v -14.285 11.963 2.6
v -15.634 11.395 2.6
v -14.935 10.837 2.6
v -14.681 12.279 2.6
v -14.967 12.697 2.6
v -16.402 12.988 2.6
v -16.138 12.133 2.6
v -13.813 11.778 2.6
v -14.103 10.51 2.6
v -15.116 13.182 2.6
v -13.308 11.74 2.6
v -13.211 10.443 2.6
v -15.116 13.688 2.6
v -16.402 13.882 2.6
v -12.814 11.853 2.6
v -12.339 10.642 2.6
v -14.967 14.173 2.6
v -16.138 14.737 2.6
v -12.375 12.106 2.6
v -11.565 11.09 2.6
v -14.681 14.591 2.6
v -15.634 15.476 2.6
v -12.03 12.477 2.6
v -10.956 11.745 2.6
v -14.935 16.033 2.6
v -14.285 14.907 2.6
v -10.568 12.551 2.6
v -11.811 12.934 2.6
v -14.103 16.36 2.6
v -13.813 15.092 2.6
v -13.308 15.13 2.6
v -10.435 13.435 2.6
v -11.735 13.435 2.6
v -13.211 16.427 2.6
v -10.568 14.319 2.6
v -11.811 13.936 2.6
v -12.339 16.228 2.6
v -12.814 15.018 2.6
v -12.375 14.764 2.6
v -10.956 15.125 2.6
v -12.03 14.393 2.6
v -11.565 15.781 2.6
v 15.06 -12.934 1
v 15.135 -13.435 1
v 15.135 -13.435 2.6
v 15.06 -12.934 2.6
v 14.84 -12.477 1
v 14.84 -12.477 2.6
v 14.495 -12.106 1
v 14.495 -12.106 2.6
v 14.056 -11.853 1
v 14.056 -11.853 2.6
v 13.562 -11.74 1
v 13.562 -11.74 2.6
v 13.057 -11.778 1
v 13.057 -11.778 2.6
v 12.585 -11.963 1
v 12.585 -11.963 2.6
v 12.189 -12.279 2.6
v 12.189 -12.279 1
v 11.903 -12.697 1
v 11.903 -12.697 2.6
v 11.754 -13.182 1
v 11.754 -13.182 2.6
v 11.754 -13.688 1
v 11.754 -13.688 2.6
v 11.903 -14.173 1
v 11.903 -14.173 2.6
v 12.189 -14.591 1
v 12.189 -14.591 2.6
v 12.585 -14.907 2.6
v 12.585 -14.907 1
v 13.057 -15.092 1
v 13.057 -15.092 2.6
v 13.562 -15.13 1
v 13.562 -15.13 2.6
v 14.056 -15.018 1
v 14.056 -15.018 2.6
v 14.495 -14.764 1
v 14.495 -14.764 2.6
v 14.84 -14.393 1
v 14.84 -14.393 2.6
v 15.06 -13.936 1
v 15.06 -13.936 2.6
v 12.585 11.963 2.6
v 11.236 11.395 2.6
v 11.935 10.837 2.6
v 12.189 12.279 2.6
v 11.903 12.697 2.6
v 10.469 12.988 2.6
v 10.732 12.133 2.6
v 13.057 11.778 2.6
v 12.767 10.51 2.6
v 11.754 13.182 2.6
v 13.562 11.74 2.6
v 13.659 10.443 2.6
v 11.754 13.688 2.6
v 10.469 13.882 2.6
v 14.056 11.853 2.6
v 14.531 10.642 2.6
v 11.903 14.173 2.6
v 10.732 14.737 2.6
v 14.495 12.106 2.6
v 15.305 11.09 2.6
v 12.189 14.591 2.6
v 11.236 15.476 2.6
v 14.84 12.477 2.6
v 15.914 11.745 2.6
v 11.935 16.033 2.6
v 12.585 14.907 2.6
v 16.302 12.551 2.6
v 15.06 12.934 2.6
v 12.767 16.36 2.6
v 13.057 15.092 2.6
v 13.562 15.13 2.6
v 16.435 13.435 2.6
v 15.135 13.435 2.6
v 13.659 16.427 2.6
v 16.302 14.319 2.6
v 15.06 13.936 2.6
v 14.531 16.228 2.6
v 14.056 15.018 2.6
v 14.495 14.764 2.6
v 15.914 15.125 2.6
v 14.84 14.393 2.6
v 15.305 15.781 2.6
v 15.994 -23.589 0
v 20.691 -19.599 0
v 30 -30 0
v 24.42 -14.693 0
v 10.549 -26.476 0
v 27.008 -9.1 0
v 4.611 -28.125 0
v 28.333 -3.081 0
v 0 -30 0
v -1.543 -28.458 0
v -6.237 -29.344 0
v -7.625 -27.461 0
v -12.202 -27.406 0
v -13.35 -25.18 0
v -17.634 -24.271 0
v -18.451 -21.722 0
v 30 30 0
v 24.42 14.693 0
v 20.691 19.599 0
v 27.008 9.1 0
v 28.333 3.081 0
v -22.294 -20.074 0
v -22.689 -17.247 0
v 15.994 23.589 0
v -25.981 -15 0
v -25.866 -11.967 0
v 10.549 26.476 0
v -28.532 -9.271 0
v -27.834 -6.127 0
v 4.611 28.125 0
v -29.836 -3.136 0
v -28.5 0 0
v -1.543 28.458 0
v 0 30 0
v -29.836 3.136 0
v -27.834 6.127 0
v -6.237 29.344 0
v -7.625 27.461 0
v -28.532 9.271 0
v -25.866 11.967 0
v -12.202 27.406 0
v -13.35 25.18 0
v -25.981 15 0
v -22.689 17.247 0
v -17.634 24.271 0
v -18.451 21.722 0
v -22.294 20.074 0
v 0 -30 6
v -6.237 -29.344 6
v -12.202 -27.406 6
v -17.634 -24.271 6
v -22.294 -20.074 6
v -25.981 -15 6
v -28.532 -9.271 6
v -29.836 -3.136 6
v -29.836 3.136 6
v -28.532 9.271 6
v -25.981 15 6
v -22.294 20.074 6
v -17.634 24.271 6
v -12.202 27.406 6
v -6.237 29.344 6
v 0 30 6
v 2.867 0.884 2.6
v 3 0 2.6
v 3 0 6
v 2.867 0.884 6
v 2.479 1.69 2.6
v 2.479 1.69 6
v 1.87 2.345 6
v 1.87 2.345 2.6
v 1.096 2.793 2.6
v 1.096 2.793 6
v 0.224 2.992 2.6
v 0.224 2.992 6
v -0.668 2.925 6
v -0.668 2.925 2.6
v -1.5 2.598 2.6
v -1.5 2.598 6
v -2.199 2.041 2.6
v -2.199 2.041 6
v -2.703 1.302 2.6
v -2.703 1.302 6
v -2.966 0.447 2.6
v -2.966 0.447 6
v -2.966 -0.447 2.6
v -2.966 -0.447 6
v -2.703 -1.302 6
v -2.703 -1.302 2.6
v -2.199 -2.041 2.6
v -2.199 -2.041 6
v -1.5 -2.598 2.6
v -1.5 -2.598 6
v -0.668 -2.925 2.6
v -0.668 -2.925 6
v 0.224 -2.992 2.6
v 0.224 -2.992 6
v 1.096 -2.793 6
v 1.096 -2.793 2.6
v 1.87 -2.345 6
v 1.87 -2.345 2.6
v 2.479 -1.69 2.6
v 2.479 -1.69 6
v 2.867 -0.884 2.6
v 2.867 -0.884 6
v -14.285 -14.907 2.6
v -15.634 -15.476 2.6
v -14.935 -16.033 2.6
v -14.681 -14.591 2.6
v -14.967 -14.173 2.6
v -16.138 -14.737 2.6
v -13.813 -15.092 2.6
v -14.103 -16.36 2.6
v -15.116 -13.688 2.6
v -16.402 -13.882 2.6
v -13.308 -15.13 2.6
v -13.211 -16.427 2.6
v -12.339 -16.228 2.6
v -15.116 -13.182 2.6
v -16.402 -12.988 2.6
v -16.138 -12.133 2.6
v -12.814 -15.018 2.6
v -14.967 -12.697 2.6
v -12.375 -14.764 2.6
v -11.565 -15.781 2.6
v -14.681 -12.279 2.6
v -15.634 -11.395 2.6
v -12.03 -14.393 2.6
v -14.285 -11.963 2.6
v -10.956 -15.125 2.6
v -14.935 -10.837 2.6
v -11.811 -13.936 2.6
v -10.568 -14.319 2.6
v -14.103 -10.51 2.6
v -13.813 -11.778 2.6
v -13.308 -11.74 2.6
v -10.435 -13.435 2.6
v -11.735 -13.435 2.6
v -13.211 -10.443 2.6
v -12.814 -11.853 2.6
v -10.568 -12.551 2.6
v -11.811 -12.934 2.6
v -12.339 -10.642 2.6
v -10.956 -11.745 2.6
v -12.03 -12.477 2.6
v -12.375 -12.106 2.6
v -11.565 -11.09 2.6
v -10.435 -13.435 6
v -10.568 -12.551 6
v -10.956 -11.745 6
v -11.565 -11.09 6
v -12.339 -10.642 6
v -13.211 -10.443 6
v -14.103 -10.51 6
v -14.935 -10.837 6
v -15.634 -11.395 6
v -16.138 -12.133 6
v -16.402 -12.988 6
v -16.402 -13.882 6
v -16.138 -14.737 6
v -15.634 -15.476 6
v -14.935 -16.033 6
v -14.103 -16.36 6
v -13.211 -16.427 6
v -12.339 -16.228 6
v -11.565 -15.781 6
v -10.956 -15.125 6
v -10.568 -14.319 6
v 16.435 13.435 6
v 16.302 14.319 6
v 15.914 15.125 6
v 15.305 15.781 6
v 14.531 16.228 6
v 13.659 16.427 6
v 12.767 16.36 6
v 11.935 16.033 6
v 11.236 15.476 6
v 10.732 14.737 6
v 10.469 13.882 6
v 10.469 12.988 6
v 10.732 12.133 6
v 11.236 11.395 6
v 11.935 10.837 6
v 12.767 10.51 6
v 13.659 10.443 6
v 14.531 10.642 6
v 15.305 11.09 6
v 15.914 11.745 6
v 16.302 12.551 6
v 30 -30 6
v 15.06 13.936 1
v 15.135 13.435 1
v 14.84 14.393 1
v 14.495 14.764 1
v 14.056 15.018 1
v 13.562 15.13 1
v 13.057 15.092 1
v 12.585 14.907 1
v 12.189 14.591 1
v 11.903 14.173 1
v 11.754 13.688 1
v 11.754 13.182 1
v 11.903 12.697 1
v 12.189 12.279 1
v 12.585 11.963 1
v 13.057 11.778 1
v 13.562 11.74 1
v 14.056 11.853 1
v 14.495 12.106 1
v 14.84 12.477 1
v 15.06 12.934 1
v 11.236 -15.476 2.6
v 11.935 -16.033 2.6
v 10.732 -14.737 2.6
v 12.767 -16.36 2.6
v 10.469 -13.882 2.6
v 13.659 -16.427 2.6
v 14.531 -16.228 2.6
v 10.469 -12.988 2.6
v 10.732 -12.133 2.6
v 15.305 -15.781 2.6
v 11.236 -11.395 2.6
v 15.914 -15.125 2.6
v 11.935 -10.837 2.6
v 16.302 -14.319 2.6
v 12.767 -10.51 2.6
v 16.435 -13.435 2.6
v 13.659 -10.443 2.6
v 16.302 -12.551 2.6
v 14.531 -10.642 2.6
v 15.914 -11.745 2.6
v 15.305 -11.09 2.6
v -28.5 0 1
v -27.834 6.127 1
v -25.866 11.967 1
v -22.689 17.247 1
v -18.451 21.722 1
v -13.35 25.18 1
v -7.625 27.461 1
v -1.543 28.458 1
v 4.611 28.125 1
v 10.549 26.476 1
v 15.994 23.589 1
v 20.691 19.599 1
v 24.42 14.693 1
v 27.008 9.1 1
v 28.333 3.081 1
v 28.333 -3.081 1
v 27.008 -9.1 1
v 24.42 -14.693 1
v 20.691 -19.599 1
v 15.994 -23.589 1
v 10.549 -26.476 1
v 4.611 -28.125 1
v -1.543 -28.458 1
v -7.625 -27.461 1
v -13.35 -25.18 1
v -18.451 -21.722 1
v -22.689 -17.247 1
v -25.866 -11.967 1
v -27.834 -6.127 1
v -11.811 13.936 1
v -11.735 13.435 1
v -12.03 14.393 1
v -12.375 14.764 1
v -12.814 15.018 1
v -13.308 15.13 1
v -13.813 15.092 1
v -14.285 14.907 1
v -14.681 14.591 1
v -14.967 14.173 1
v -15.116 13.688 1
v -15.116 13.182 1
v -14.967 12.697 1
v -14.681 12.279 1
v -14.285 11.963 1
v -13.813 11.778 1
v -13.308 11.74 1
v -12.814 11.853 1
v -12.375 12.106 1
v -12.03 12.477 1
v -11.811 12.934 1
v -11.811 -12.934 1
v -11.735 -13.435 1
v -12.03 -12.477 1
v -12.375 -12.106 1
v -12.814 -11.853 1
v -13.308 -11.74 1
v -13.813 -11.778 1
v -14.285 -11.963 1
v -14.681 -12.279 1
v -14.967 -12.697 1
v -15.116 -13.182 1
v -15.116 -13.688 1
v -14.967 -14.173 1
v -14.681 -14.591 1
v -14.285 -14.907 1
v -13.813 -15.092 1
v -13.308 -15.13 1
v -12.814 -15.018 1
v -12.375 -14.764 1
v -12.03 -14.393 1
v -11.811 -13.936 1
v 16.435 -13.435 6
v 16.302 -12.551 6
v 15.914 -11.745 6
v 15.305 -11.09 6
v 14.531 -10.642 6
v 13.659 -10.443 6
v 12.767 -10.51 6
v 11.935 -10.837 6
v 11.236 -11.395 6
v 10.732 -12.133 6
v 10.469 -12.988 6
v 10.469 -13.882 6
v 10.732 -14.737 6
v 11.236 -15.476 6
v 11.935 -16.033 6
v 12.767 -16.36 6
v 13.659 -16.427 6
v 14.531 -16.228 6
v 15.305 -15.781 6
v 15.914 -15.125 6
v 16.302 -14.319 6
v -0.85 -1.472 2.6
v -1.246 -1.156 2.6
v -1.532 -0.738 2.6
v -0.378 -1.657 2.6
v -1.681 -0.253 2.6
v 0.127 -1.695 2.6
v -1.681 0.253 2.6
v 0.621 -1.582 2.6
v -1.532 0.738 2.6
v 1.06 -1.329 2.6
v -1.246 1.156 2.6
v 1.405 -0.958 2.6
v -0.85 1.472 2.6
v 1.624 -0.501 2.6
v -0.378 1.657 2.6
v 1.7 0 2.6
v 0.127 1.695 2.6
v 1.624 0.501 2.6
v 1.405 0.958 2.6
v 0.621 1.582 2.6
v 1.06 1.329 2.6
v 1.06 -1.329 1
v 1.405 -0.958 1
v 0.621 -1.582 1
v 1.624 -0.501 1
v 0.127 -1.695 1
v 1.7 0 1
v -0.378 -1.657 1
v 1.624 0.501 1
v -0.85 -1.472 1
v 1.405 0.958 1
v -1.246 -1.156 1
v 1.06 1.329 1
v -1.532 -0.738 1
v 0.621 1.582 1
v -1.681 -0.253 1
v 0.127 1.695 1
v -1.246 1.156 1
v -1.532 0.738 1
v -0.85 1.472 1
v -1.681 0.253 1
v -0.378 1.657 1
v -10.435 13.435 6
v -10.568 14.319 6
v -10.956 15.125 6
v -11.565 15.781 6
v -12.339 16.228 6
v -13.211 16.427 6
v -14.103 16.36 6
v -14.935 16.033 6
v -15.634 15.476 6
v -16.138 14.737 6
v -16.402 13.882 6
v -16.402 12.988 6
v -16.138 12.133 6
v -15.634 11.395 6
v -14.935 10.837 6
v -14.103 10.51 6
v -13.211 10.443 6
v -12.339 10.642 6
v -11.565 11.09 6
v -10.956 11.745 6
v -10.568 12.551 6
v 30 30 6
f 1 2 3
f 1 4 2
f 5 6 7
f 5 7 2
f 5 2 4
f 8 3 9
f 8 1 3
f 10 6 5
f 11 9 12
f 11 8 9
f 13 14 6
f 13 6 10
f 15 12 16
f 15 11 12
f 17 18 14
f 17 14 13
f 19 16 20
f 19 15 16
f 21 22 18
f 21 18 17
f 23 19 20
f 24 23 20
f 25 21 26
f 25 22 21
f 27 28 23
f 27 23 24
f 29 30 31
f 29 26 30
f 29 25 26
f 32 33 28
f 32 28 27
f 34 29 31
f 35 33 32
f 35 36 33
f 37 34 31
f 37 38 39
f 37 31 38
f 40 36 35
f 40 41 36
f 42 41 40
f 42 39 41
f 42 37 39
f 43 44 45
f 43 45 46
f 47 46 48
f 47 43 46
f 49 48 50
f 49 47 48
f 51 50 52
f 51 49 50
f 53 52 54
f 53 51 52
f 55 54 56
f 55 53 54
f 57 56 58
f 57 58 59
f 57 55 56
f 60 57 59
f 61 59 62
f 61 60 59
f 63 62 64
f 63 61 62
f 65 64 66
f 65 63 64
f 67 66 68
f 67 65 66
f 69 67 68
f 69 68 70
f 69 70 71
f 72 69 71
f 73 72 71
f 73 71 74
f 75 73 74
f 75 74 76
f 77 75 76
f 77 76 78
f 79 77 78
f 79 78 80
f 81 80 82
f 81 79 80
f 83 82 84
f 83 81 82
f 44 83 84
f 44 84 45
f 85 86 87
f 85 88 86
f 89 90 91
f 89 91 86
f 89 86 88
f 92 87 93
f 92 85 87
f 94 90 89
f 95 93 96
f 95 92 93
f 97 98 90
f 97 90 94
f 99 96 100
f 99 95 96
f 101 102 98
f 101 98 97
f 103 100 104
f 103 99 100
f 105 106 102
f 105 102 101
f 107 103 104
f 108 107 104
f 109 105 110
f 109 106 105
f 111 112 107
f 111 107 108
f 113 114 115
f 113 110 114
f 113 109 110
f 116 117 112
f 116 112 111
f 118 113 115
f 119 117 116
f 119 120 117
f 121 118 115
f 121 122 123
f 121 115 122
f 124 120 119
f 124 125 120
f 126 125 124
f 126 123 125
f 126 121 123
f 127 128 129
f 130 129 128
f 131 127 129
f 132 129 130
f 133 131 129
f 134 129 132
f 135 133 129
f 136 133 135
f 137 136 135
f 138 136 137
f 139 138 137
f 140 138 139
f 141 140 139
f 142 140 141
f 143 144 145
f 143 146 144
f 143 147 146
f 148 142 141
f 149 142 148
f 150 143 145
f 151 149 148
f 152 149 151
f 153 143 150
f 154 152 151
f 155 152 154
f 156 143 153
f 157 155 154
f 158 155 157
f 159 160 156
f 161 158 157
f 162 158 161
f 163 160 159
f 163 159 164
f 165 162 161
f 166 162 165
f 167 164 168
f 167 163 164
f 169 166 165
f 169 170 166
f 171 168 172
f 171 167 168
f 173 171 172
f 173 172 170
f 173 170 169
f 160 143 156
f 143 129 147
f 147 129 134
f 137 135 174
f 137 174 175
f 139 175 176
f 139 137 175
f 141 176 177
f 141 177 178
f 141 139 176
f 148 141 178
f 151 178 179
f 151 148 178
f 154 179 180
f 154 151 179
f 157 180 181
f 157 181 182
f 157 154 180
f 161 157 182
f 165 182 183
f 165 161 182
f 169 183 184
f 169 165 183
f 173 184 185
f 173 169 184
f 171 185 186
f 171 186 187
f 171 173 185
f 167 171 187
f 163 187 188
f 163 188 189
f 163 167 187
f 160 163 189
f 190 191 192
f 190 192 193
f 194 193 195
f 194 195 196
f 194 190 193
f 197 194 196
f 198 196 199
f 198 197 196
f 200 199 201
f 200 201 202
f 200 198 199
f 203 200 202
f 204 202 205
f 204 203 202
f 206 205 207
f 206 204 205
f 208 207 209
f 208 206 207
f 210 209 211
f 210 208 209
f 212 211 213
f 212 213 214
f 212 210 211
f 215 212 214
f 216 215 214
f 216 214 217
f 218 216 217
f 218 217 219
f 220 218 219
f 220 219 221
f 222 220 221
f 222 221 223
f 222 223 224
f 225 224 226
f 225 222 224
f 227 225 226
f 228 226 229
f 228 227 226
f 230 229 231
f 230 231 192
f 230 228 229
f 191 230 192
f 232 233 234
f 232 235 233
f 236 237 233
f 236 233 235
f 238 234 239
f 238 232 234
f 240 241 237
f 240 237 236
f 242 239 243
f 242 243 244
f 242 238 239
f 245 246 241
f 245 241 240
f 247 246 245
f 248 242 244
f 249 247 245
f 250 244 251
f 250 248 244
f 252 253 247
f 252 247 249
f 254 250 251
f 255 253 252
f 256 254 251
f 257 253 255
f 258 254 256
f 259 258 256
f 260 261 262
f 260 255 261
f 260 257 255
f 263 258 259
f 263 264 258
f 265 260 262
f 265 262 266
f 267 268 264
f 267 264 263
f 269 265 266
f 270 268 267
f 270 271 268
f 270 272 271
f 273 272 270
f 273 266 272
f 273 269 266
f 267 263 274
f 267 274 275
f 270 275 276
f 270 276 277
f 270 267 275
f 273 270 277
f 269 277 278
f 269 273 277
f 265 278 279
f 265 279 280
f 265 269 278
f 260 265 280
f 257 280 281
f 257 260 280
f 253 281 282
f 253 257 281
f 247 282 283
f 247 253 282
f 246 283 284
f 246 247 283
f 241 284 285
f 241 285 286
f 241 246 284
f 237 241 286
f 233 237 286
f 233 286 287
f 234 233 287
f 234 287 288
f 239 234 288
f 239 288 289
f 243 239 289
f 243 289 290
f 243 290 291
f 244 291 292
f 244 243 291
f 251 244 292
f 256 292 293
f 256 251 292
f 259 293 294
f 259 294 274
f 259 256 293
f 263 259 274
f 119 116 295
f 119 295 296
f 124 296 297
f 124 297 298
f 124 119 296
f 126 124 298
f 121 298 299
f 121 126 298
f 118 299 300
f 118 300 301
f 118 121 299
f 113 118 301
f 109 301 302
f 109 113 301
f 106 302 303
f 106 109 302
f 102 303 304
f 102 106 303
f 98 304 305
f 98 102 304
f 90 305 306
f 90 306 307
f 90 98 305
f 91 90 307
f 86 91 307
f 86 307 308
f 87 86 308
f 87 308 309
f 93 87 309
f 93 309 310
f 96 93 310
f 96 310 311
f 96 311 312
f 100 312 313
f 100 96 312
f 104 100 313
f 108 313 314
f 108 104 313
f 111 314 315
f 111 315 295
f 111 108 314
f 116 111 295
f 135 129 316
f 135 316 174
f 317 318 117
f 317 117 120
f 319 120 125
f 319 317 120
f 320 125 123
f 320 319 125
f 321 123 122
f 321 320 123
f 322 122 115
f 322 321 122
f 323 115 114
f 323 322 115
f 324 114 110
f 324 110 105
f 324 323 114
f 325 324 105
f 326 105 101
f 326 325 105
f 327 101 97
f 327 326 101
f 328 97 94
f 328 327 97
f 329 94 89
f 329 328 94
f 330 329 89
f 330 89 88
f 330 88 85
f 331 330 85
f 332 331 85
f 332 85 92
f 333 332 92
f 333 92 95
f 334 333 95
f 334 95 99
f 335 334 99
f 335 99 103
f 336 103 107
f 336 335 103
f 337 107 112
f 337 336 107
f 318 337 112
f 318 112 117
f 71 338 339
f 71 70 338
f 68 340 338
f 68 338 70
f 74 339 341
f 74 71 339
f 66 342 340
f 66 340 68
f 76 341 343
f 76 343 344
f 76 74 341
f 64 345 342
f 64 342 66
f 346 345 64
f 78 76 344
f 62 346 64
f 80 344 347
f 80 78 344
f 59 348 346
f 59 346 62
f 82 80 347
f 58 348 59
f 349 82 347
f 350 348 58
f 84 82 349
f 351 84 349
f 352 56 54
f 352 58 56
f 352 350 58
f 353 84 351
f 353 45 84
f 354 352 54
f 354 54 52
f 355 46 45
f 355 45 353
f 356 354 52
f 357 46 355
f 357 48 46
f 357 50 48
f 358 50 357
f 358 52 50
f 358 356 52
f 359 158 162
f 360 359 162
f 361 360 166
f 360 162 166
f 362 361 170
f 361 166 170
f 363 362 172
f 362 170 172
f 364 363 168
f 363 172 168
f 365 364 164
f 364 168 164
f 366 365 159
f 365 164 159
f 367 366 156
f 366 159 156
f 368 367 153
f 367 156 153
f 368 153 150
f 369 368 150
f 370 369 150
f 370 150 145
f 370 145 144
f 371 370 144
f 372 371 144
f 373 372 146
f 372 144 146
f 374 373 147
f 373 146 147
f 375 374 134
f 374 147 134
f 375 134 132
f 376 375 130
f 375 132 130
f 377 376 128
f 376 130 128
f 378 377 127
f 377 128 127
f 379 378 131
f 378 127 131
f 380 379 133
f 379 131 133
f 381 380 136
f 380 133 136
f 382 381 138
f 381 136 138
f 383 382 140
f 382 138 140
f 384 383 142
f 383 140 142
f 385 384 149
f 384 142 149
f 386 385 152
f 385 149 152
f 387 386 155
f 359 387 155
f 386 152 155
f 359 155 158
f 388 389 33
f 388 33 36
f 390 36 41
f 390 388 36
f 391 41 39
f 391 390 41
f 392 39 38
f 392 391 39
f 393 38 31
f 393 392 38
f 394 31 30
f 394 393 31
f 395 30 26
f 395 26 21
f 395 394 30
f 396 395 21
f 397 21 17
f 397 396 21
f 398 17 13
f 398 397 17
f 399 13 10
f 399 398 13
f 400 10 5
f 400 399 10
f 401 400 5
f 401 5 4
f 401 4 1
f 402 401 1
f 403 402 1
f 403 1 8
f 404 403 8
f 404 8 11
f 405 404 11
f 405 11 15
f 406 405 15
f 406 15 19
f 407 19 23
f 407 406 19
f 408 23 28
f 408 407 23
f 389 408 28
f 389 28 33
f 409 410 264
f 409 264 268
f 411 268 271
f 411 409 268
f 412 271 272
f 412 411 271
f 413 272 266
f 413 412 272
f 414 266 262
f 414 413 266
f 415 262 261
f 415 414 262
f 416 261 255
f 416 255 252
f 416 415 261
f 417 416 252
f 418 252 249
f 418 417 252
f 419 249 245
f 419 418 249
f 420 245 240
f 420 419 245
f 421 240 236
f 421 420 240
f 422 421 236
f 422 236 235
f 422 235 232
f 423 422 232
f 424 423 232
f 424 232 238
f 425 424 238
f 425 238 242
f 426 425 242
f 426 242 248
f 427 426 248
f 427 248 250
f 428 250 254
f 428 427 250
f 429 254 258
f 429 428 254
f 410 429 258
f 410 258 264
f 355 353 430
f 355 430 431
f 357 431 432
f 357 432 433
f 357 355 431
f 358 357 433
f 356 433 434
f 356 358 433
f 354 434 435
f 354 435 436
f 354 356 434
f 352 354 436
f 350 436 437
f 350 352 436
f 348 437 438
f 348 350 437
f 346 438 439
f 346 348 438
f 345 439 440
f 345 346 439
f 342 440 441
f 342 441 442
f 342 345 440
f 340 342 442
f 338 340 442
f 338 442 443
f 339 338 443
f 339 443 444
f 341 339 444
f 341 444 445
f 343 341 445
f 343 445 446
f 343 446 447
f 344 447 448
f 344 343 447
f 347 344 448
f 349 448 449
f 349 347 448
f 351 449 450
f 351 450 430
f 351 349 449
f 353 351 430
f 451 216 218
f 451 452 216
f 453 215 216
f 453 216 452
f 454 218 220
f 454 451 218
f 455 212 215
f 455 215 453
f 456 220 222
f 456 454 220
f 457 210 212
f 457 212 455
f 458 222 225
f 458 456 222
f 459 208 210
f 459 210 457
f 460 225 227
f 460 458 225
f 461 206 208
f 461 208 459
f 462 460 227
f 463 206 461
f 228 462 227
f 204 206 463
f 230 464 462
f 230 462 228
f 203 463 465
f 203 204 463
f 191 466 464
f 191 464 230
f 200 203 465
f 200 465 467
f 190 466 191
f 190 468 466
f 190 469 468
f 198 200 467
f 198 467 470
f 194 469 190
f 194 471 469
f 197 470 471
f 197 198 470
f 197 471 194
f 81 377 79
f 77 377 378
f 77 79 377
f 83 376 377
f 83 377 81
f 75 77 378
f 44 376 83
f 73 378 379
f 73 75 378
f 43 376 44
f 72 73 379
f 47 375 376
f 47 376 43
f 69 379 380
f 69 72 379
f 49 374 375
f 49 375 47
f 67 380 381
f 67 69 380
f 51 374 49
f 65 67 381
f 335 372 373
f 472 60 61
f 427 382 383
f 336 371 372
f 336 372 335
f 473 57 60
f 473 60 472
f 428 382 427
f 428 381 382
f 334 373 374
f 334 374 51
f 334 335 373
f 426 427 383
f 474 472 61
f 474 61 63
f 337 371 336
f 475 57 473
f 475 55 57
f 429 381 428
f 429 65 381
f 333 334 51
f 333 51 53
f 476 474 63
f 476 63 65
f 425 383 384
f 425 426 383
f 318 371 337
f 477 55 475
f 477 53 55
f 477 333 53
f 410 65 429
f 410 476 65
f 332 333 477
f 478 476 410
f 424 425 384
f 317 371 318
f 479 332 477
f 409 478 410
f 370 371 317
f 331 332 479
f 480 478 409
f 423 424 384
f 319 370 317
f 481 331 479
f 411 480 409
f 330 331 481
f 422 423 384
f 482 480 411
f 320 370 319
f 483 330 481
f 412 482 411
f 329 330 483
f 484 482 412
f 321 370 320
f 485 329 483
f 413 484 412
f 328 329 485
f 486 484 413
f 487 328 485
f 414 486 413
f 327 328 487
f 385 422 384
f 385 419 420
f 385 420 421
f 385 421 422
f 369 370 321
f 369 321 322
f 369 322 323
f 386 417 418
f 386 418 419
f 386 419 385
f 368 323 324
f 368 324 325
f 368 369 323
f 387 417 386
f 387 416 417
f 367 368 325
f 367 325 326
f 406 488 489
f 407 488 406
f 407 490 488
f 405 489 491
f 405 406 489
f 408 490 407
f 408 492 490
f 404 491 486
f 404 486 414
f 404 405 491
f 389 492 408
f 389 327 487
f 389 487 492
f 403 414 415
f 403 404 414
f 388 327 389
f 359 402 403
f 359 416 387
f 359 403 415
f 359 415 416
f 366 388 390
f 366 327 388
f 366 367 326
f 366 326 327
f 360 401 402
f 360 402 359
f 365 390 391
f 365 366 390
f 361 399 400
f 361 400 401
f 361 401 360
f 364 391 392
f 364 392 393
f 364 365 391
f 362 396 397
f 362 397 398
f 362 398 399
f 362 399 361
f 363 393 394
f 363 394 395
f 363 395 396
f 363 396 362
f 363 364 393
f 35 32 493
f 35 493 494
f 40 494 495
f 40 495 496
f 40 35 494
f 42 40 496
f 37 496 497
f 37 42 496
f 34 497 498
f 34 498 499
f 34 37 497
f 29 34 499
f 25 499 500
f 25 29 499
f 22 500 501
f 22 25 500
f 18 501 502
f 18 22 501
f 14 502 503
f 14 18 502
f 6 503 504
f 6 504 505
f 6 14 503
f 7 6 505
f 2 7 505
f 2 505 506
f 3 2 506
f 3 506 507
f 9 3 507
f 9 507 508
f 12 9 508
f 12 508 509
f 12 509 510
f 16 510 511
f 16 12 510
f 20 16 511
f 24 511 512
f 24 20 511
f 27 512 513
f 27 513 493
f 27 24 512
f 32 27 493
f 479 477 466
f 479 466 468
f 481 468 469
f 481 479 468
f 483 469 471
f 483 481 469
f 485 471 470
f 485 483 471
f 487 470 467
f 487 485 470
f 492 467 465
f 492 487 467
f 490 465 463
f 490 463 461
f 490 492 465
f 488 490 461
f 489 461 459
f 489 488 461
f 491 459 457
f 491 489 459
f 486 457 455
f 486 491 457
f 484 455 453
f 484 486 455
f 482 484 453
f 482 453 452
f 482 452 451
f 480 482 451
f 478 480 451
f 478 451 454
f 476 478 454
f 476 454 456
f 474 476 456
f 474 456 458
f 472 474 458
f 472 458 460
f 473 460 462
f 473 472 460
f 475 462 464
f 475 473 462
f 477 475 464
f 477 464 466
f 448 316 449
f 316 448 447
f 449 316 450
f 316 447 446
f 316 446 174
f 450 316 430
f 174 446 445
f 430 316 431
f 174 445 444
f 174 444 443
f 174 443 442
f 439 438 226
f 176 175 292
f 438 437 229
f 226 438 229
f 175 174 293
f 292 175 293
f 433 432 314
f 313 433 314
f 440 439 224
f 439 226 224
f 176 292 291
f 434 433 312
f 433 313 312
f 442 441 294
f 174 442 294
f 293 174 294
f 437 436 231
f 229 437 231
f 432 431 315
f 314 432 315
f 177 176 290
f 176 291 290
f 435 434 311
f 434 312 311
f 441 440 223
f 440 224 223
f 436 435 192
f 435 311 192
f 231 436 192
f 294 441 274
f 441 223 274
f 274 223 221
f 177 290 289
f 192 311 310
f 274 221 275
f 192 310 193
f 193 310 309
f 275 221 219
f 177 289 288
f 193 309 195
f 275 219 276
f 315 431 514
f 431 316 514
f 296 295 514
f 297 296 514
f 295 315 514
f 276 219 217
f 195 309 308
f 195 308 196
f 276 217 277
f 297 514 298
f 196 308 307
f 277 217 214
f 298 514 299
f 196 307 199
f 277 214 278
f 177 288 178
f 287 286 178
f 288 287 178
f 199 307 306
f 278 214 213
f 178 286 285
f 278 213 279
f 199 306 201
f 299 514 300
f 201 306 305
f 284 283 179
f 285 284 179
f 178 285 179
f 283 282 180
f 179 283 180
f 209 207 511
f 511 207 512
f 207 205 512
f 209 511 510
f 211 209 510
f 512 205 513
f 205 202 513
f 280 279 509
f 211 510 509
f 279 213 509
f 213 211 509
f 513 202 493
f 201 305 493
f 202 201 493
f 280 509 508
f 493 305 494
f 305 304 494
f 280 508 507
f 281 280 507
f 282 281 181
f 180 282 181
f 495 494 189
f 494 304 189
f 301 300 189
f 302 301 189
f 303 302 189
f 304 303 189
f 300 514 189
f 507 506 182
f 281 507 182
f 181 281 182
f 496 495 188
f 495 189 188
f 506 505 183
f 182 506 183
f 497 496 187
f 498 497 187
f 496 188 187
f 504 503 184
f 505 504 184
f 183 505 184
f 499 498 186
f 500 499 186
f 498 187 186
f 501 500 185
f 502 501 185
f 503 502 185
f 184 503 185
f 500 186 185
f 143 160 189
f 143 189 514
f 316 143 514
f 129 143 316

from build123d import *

# Parameters (mm, degrees)
EXTRUDE_1_DEPTH              = 6
SKETCH_2_R                   = 28.5
CUT_EXTRUDE_1_DEPTH          = 1
HOLE_START                   = 2.6
HOLE_WIZARD_M3_1_OUTLINE_R   = 3
HOLE_WIZARD_M3_1_DEPTH       = 3.4
HOLE_START_2                 = 1
HOLE_WIZARD_M3_1_2_OUTLINE_R = 1.7
HOLE_WIZARD_M3_1_2_DEPTH     = 1.6


# Read off the part's stored shape, not the designer's step: M3 六角圆柱头螺钉的柱形沉头孔1
with BuildPart() as part:
    # 草图1 → 凸台-拉伸1 (new body)
    with BuildSketch(Plane.XY):
        with BuildLine():
            Line((0, 30), (30, 30))
            Line((30, 30), (30, -30))
            Line((30, -30), (0, -30))
            ThreePointArc((0, -30), (-30, 0), (0, 30))
        make_face()
    extrude(amount=EXTRUDE_1_DEPTH)

    # 草图2 → 切除-拉伸1 (cut)
    with BuildSketch(Plane(origin=(0, 0, 0), x_dir=(-1, 0, 0), z_dir=(0, 0, -1))):
        Circle(SKETCH_2_R)
    extrude(amount=-CUT_EXTRUDE_1_DEPTH, mode=Mode.SUBTRACT)

    # M3 六角圆柱头螺钉的柱形沉头孔1 outline → M3 六角圆柱头螺钉的柱形沉头孔1 (cut)
    with BuildSketch(Plane.XY.offset(HOLE_START)):
        with Locations((13.435028843, 13.435028843)):
            Circle(HOLE_WIZARD_M3_1_OUTLINE_R)
        with Locations((-13.435028843, -13.435028843)):
            Circle(HOLE_WIZARD_M3_1_OUTLINE_R)
        with Locations((-13.435028843, 13.435028843)):
            Circle(HOLE_WIZARD_M3_1_OUTLINE_R)
        with Locations((13.435028843, -13.435028843)):
            Circle(HOLE_WIZARD_M3_1_OUTLINE_R)
        Circle(HOLE_WIZARD_M3_1_OUTLINE_R)
    extrude(amount=HOLE_WIZARD_M3_1_DEPTH, mode=Mode.SUBTRACT)

    # Hole Wizard M3 _1 2 outline → Hole Wizard M3 _1 2 (cut)
    with BuildSketch(Plane.XY.offset(HOLE_START_2)):
        with Locations((13.435028843, 13.435028843)):
            Circle(HOLE_WIZARD_M3_1_2_OUTLINE_R)
        with Locations((-13.435028843, -13.435028843)):
            Circle(HOLE_WIZARD_M3_1_2_OUTLINE_R)
        with Locations((-13.435028843, 13.435028843)):
            Circle(HOLE_WIZARD_M3_1_2_OUTLINE_R)
        with Locations((13.435028843, -13.435028843)):
            Circle(HOLE_WIZARD_M3_1_2_OUTLINE_R)
        Circle(HOLE_WIZARD_M3_1_2_OUTLINE_R)
    extrude(amount=HOLE_WIZARD_M3_1_2_DEPTH, mode=Mode.SUBTRACT)


solid = part.part
